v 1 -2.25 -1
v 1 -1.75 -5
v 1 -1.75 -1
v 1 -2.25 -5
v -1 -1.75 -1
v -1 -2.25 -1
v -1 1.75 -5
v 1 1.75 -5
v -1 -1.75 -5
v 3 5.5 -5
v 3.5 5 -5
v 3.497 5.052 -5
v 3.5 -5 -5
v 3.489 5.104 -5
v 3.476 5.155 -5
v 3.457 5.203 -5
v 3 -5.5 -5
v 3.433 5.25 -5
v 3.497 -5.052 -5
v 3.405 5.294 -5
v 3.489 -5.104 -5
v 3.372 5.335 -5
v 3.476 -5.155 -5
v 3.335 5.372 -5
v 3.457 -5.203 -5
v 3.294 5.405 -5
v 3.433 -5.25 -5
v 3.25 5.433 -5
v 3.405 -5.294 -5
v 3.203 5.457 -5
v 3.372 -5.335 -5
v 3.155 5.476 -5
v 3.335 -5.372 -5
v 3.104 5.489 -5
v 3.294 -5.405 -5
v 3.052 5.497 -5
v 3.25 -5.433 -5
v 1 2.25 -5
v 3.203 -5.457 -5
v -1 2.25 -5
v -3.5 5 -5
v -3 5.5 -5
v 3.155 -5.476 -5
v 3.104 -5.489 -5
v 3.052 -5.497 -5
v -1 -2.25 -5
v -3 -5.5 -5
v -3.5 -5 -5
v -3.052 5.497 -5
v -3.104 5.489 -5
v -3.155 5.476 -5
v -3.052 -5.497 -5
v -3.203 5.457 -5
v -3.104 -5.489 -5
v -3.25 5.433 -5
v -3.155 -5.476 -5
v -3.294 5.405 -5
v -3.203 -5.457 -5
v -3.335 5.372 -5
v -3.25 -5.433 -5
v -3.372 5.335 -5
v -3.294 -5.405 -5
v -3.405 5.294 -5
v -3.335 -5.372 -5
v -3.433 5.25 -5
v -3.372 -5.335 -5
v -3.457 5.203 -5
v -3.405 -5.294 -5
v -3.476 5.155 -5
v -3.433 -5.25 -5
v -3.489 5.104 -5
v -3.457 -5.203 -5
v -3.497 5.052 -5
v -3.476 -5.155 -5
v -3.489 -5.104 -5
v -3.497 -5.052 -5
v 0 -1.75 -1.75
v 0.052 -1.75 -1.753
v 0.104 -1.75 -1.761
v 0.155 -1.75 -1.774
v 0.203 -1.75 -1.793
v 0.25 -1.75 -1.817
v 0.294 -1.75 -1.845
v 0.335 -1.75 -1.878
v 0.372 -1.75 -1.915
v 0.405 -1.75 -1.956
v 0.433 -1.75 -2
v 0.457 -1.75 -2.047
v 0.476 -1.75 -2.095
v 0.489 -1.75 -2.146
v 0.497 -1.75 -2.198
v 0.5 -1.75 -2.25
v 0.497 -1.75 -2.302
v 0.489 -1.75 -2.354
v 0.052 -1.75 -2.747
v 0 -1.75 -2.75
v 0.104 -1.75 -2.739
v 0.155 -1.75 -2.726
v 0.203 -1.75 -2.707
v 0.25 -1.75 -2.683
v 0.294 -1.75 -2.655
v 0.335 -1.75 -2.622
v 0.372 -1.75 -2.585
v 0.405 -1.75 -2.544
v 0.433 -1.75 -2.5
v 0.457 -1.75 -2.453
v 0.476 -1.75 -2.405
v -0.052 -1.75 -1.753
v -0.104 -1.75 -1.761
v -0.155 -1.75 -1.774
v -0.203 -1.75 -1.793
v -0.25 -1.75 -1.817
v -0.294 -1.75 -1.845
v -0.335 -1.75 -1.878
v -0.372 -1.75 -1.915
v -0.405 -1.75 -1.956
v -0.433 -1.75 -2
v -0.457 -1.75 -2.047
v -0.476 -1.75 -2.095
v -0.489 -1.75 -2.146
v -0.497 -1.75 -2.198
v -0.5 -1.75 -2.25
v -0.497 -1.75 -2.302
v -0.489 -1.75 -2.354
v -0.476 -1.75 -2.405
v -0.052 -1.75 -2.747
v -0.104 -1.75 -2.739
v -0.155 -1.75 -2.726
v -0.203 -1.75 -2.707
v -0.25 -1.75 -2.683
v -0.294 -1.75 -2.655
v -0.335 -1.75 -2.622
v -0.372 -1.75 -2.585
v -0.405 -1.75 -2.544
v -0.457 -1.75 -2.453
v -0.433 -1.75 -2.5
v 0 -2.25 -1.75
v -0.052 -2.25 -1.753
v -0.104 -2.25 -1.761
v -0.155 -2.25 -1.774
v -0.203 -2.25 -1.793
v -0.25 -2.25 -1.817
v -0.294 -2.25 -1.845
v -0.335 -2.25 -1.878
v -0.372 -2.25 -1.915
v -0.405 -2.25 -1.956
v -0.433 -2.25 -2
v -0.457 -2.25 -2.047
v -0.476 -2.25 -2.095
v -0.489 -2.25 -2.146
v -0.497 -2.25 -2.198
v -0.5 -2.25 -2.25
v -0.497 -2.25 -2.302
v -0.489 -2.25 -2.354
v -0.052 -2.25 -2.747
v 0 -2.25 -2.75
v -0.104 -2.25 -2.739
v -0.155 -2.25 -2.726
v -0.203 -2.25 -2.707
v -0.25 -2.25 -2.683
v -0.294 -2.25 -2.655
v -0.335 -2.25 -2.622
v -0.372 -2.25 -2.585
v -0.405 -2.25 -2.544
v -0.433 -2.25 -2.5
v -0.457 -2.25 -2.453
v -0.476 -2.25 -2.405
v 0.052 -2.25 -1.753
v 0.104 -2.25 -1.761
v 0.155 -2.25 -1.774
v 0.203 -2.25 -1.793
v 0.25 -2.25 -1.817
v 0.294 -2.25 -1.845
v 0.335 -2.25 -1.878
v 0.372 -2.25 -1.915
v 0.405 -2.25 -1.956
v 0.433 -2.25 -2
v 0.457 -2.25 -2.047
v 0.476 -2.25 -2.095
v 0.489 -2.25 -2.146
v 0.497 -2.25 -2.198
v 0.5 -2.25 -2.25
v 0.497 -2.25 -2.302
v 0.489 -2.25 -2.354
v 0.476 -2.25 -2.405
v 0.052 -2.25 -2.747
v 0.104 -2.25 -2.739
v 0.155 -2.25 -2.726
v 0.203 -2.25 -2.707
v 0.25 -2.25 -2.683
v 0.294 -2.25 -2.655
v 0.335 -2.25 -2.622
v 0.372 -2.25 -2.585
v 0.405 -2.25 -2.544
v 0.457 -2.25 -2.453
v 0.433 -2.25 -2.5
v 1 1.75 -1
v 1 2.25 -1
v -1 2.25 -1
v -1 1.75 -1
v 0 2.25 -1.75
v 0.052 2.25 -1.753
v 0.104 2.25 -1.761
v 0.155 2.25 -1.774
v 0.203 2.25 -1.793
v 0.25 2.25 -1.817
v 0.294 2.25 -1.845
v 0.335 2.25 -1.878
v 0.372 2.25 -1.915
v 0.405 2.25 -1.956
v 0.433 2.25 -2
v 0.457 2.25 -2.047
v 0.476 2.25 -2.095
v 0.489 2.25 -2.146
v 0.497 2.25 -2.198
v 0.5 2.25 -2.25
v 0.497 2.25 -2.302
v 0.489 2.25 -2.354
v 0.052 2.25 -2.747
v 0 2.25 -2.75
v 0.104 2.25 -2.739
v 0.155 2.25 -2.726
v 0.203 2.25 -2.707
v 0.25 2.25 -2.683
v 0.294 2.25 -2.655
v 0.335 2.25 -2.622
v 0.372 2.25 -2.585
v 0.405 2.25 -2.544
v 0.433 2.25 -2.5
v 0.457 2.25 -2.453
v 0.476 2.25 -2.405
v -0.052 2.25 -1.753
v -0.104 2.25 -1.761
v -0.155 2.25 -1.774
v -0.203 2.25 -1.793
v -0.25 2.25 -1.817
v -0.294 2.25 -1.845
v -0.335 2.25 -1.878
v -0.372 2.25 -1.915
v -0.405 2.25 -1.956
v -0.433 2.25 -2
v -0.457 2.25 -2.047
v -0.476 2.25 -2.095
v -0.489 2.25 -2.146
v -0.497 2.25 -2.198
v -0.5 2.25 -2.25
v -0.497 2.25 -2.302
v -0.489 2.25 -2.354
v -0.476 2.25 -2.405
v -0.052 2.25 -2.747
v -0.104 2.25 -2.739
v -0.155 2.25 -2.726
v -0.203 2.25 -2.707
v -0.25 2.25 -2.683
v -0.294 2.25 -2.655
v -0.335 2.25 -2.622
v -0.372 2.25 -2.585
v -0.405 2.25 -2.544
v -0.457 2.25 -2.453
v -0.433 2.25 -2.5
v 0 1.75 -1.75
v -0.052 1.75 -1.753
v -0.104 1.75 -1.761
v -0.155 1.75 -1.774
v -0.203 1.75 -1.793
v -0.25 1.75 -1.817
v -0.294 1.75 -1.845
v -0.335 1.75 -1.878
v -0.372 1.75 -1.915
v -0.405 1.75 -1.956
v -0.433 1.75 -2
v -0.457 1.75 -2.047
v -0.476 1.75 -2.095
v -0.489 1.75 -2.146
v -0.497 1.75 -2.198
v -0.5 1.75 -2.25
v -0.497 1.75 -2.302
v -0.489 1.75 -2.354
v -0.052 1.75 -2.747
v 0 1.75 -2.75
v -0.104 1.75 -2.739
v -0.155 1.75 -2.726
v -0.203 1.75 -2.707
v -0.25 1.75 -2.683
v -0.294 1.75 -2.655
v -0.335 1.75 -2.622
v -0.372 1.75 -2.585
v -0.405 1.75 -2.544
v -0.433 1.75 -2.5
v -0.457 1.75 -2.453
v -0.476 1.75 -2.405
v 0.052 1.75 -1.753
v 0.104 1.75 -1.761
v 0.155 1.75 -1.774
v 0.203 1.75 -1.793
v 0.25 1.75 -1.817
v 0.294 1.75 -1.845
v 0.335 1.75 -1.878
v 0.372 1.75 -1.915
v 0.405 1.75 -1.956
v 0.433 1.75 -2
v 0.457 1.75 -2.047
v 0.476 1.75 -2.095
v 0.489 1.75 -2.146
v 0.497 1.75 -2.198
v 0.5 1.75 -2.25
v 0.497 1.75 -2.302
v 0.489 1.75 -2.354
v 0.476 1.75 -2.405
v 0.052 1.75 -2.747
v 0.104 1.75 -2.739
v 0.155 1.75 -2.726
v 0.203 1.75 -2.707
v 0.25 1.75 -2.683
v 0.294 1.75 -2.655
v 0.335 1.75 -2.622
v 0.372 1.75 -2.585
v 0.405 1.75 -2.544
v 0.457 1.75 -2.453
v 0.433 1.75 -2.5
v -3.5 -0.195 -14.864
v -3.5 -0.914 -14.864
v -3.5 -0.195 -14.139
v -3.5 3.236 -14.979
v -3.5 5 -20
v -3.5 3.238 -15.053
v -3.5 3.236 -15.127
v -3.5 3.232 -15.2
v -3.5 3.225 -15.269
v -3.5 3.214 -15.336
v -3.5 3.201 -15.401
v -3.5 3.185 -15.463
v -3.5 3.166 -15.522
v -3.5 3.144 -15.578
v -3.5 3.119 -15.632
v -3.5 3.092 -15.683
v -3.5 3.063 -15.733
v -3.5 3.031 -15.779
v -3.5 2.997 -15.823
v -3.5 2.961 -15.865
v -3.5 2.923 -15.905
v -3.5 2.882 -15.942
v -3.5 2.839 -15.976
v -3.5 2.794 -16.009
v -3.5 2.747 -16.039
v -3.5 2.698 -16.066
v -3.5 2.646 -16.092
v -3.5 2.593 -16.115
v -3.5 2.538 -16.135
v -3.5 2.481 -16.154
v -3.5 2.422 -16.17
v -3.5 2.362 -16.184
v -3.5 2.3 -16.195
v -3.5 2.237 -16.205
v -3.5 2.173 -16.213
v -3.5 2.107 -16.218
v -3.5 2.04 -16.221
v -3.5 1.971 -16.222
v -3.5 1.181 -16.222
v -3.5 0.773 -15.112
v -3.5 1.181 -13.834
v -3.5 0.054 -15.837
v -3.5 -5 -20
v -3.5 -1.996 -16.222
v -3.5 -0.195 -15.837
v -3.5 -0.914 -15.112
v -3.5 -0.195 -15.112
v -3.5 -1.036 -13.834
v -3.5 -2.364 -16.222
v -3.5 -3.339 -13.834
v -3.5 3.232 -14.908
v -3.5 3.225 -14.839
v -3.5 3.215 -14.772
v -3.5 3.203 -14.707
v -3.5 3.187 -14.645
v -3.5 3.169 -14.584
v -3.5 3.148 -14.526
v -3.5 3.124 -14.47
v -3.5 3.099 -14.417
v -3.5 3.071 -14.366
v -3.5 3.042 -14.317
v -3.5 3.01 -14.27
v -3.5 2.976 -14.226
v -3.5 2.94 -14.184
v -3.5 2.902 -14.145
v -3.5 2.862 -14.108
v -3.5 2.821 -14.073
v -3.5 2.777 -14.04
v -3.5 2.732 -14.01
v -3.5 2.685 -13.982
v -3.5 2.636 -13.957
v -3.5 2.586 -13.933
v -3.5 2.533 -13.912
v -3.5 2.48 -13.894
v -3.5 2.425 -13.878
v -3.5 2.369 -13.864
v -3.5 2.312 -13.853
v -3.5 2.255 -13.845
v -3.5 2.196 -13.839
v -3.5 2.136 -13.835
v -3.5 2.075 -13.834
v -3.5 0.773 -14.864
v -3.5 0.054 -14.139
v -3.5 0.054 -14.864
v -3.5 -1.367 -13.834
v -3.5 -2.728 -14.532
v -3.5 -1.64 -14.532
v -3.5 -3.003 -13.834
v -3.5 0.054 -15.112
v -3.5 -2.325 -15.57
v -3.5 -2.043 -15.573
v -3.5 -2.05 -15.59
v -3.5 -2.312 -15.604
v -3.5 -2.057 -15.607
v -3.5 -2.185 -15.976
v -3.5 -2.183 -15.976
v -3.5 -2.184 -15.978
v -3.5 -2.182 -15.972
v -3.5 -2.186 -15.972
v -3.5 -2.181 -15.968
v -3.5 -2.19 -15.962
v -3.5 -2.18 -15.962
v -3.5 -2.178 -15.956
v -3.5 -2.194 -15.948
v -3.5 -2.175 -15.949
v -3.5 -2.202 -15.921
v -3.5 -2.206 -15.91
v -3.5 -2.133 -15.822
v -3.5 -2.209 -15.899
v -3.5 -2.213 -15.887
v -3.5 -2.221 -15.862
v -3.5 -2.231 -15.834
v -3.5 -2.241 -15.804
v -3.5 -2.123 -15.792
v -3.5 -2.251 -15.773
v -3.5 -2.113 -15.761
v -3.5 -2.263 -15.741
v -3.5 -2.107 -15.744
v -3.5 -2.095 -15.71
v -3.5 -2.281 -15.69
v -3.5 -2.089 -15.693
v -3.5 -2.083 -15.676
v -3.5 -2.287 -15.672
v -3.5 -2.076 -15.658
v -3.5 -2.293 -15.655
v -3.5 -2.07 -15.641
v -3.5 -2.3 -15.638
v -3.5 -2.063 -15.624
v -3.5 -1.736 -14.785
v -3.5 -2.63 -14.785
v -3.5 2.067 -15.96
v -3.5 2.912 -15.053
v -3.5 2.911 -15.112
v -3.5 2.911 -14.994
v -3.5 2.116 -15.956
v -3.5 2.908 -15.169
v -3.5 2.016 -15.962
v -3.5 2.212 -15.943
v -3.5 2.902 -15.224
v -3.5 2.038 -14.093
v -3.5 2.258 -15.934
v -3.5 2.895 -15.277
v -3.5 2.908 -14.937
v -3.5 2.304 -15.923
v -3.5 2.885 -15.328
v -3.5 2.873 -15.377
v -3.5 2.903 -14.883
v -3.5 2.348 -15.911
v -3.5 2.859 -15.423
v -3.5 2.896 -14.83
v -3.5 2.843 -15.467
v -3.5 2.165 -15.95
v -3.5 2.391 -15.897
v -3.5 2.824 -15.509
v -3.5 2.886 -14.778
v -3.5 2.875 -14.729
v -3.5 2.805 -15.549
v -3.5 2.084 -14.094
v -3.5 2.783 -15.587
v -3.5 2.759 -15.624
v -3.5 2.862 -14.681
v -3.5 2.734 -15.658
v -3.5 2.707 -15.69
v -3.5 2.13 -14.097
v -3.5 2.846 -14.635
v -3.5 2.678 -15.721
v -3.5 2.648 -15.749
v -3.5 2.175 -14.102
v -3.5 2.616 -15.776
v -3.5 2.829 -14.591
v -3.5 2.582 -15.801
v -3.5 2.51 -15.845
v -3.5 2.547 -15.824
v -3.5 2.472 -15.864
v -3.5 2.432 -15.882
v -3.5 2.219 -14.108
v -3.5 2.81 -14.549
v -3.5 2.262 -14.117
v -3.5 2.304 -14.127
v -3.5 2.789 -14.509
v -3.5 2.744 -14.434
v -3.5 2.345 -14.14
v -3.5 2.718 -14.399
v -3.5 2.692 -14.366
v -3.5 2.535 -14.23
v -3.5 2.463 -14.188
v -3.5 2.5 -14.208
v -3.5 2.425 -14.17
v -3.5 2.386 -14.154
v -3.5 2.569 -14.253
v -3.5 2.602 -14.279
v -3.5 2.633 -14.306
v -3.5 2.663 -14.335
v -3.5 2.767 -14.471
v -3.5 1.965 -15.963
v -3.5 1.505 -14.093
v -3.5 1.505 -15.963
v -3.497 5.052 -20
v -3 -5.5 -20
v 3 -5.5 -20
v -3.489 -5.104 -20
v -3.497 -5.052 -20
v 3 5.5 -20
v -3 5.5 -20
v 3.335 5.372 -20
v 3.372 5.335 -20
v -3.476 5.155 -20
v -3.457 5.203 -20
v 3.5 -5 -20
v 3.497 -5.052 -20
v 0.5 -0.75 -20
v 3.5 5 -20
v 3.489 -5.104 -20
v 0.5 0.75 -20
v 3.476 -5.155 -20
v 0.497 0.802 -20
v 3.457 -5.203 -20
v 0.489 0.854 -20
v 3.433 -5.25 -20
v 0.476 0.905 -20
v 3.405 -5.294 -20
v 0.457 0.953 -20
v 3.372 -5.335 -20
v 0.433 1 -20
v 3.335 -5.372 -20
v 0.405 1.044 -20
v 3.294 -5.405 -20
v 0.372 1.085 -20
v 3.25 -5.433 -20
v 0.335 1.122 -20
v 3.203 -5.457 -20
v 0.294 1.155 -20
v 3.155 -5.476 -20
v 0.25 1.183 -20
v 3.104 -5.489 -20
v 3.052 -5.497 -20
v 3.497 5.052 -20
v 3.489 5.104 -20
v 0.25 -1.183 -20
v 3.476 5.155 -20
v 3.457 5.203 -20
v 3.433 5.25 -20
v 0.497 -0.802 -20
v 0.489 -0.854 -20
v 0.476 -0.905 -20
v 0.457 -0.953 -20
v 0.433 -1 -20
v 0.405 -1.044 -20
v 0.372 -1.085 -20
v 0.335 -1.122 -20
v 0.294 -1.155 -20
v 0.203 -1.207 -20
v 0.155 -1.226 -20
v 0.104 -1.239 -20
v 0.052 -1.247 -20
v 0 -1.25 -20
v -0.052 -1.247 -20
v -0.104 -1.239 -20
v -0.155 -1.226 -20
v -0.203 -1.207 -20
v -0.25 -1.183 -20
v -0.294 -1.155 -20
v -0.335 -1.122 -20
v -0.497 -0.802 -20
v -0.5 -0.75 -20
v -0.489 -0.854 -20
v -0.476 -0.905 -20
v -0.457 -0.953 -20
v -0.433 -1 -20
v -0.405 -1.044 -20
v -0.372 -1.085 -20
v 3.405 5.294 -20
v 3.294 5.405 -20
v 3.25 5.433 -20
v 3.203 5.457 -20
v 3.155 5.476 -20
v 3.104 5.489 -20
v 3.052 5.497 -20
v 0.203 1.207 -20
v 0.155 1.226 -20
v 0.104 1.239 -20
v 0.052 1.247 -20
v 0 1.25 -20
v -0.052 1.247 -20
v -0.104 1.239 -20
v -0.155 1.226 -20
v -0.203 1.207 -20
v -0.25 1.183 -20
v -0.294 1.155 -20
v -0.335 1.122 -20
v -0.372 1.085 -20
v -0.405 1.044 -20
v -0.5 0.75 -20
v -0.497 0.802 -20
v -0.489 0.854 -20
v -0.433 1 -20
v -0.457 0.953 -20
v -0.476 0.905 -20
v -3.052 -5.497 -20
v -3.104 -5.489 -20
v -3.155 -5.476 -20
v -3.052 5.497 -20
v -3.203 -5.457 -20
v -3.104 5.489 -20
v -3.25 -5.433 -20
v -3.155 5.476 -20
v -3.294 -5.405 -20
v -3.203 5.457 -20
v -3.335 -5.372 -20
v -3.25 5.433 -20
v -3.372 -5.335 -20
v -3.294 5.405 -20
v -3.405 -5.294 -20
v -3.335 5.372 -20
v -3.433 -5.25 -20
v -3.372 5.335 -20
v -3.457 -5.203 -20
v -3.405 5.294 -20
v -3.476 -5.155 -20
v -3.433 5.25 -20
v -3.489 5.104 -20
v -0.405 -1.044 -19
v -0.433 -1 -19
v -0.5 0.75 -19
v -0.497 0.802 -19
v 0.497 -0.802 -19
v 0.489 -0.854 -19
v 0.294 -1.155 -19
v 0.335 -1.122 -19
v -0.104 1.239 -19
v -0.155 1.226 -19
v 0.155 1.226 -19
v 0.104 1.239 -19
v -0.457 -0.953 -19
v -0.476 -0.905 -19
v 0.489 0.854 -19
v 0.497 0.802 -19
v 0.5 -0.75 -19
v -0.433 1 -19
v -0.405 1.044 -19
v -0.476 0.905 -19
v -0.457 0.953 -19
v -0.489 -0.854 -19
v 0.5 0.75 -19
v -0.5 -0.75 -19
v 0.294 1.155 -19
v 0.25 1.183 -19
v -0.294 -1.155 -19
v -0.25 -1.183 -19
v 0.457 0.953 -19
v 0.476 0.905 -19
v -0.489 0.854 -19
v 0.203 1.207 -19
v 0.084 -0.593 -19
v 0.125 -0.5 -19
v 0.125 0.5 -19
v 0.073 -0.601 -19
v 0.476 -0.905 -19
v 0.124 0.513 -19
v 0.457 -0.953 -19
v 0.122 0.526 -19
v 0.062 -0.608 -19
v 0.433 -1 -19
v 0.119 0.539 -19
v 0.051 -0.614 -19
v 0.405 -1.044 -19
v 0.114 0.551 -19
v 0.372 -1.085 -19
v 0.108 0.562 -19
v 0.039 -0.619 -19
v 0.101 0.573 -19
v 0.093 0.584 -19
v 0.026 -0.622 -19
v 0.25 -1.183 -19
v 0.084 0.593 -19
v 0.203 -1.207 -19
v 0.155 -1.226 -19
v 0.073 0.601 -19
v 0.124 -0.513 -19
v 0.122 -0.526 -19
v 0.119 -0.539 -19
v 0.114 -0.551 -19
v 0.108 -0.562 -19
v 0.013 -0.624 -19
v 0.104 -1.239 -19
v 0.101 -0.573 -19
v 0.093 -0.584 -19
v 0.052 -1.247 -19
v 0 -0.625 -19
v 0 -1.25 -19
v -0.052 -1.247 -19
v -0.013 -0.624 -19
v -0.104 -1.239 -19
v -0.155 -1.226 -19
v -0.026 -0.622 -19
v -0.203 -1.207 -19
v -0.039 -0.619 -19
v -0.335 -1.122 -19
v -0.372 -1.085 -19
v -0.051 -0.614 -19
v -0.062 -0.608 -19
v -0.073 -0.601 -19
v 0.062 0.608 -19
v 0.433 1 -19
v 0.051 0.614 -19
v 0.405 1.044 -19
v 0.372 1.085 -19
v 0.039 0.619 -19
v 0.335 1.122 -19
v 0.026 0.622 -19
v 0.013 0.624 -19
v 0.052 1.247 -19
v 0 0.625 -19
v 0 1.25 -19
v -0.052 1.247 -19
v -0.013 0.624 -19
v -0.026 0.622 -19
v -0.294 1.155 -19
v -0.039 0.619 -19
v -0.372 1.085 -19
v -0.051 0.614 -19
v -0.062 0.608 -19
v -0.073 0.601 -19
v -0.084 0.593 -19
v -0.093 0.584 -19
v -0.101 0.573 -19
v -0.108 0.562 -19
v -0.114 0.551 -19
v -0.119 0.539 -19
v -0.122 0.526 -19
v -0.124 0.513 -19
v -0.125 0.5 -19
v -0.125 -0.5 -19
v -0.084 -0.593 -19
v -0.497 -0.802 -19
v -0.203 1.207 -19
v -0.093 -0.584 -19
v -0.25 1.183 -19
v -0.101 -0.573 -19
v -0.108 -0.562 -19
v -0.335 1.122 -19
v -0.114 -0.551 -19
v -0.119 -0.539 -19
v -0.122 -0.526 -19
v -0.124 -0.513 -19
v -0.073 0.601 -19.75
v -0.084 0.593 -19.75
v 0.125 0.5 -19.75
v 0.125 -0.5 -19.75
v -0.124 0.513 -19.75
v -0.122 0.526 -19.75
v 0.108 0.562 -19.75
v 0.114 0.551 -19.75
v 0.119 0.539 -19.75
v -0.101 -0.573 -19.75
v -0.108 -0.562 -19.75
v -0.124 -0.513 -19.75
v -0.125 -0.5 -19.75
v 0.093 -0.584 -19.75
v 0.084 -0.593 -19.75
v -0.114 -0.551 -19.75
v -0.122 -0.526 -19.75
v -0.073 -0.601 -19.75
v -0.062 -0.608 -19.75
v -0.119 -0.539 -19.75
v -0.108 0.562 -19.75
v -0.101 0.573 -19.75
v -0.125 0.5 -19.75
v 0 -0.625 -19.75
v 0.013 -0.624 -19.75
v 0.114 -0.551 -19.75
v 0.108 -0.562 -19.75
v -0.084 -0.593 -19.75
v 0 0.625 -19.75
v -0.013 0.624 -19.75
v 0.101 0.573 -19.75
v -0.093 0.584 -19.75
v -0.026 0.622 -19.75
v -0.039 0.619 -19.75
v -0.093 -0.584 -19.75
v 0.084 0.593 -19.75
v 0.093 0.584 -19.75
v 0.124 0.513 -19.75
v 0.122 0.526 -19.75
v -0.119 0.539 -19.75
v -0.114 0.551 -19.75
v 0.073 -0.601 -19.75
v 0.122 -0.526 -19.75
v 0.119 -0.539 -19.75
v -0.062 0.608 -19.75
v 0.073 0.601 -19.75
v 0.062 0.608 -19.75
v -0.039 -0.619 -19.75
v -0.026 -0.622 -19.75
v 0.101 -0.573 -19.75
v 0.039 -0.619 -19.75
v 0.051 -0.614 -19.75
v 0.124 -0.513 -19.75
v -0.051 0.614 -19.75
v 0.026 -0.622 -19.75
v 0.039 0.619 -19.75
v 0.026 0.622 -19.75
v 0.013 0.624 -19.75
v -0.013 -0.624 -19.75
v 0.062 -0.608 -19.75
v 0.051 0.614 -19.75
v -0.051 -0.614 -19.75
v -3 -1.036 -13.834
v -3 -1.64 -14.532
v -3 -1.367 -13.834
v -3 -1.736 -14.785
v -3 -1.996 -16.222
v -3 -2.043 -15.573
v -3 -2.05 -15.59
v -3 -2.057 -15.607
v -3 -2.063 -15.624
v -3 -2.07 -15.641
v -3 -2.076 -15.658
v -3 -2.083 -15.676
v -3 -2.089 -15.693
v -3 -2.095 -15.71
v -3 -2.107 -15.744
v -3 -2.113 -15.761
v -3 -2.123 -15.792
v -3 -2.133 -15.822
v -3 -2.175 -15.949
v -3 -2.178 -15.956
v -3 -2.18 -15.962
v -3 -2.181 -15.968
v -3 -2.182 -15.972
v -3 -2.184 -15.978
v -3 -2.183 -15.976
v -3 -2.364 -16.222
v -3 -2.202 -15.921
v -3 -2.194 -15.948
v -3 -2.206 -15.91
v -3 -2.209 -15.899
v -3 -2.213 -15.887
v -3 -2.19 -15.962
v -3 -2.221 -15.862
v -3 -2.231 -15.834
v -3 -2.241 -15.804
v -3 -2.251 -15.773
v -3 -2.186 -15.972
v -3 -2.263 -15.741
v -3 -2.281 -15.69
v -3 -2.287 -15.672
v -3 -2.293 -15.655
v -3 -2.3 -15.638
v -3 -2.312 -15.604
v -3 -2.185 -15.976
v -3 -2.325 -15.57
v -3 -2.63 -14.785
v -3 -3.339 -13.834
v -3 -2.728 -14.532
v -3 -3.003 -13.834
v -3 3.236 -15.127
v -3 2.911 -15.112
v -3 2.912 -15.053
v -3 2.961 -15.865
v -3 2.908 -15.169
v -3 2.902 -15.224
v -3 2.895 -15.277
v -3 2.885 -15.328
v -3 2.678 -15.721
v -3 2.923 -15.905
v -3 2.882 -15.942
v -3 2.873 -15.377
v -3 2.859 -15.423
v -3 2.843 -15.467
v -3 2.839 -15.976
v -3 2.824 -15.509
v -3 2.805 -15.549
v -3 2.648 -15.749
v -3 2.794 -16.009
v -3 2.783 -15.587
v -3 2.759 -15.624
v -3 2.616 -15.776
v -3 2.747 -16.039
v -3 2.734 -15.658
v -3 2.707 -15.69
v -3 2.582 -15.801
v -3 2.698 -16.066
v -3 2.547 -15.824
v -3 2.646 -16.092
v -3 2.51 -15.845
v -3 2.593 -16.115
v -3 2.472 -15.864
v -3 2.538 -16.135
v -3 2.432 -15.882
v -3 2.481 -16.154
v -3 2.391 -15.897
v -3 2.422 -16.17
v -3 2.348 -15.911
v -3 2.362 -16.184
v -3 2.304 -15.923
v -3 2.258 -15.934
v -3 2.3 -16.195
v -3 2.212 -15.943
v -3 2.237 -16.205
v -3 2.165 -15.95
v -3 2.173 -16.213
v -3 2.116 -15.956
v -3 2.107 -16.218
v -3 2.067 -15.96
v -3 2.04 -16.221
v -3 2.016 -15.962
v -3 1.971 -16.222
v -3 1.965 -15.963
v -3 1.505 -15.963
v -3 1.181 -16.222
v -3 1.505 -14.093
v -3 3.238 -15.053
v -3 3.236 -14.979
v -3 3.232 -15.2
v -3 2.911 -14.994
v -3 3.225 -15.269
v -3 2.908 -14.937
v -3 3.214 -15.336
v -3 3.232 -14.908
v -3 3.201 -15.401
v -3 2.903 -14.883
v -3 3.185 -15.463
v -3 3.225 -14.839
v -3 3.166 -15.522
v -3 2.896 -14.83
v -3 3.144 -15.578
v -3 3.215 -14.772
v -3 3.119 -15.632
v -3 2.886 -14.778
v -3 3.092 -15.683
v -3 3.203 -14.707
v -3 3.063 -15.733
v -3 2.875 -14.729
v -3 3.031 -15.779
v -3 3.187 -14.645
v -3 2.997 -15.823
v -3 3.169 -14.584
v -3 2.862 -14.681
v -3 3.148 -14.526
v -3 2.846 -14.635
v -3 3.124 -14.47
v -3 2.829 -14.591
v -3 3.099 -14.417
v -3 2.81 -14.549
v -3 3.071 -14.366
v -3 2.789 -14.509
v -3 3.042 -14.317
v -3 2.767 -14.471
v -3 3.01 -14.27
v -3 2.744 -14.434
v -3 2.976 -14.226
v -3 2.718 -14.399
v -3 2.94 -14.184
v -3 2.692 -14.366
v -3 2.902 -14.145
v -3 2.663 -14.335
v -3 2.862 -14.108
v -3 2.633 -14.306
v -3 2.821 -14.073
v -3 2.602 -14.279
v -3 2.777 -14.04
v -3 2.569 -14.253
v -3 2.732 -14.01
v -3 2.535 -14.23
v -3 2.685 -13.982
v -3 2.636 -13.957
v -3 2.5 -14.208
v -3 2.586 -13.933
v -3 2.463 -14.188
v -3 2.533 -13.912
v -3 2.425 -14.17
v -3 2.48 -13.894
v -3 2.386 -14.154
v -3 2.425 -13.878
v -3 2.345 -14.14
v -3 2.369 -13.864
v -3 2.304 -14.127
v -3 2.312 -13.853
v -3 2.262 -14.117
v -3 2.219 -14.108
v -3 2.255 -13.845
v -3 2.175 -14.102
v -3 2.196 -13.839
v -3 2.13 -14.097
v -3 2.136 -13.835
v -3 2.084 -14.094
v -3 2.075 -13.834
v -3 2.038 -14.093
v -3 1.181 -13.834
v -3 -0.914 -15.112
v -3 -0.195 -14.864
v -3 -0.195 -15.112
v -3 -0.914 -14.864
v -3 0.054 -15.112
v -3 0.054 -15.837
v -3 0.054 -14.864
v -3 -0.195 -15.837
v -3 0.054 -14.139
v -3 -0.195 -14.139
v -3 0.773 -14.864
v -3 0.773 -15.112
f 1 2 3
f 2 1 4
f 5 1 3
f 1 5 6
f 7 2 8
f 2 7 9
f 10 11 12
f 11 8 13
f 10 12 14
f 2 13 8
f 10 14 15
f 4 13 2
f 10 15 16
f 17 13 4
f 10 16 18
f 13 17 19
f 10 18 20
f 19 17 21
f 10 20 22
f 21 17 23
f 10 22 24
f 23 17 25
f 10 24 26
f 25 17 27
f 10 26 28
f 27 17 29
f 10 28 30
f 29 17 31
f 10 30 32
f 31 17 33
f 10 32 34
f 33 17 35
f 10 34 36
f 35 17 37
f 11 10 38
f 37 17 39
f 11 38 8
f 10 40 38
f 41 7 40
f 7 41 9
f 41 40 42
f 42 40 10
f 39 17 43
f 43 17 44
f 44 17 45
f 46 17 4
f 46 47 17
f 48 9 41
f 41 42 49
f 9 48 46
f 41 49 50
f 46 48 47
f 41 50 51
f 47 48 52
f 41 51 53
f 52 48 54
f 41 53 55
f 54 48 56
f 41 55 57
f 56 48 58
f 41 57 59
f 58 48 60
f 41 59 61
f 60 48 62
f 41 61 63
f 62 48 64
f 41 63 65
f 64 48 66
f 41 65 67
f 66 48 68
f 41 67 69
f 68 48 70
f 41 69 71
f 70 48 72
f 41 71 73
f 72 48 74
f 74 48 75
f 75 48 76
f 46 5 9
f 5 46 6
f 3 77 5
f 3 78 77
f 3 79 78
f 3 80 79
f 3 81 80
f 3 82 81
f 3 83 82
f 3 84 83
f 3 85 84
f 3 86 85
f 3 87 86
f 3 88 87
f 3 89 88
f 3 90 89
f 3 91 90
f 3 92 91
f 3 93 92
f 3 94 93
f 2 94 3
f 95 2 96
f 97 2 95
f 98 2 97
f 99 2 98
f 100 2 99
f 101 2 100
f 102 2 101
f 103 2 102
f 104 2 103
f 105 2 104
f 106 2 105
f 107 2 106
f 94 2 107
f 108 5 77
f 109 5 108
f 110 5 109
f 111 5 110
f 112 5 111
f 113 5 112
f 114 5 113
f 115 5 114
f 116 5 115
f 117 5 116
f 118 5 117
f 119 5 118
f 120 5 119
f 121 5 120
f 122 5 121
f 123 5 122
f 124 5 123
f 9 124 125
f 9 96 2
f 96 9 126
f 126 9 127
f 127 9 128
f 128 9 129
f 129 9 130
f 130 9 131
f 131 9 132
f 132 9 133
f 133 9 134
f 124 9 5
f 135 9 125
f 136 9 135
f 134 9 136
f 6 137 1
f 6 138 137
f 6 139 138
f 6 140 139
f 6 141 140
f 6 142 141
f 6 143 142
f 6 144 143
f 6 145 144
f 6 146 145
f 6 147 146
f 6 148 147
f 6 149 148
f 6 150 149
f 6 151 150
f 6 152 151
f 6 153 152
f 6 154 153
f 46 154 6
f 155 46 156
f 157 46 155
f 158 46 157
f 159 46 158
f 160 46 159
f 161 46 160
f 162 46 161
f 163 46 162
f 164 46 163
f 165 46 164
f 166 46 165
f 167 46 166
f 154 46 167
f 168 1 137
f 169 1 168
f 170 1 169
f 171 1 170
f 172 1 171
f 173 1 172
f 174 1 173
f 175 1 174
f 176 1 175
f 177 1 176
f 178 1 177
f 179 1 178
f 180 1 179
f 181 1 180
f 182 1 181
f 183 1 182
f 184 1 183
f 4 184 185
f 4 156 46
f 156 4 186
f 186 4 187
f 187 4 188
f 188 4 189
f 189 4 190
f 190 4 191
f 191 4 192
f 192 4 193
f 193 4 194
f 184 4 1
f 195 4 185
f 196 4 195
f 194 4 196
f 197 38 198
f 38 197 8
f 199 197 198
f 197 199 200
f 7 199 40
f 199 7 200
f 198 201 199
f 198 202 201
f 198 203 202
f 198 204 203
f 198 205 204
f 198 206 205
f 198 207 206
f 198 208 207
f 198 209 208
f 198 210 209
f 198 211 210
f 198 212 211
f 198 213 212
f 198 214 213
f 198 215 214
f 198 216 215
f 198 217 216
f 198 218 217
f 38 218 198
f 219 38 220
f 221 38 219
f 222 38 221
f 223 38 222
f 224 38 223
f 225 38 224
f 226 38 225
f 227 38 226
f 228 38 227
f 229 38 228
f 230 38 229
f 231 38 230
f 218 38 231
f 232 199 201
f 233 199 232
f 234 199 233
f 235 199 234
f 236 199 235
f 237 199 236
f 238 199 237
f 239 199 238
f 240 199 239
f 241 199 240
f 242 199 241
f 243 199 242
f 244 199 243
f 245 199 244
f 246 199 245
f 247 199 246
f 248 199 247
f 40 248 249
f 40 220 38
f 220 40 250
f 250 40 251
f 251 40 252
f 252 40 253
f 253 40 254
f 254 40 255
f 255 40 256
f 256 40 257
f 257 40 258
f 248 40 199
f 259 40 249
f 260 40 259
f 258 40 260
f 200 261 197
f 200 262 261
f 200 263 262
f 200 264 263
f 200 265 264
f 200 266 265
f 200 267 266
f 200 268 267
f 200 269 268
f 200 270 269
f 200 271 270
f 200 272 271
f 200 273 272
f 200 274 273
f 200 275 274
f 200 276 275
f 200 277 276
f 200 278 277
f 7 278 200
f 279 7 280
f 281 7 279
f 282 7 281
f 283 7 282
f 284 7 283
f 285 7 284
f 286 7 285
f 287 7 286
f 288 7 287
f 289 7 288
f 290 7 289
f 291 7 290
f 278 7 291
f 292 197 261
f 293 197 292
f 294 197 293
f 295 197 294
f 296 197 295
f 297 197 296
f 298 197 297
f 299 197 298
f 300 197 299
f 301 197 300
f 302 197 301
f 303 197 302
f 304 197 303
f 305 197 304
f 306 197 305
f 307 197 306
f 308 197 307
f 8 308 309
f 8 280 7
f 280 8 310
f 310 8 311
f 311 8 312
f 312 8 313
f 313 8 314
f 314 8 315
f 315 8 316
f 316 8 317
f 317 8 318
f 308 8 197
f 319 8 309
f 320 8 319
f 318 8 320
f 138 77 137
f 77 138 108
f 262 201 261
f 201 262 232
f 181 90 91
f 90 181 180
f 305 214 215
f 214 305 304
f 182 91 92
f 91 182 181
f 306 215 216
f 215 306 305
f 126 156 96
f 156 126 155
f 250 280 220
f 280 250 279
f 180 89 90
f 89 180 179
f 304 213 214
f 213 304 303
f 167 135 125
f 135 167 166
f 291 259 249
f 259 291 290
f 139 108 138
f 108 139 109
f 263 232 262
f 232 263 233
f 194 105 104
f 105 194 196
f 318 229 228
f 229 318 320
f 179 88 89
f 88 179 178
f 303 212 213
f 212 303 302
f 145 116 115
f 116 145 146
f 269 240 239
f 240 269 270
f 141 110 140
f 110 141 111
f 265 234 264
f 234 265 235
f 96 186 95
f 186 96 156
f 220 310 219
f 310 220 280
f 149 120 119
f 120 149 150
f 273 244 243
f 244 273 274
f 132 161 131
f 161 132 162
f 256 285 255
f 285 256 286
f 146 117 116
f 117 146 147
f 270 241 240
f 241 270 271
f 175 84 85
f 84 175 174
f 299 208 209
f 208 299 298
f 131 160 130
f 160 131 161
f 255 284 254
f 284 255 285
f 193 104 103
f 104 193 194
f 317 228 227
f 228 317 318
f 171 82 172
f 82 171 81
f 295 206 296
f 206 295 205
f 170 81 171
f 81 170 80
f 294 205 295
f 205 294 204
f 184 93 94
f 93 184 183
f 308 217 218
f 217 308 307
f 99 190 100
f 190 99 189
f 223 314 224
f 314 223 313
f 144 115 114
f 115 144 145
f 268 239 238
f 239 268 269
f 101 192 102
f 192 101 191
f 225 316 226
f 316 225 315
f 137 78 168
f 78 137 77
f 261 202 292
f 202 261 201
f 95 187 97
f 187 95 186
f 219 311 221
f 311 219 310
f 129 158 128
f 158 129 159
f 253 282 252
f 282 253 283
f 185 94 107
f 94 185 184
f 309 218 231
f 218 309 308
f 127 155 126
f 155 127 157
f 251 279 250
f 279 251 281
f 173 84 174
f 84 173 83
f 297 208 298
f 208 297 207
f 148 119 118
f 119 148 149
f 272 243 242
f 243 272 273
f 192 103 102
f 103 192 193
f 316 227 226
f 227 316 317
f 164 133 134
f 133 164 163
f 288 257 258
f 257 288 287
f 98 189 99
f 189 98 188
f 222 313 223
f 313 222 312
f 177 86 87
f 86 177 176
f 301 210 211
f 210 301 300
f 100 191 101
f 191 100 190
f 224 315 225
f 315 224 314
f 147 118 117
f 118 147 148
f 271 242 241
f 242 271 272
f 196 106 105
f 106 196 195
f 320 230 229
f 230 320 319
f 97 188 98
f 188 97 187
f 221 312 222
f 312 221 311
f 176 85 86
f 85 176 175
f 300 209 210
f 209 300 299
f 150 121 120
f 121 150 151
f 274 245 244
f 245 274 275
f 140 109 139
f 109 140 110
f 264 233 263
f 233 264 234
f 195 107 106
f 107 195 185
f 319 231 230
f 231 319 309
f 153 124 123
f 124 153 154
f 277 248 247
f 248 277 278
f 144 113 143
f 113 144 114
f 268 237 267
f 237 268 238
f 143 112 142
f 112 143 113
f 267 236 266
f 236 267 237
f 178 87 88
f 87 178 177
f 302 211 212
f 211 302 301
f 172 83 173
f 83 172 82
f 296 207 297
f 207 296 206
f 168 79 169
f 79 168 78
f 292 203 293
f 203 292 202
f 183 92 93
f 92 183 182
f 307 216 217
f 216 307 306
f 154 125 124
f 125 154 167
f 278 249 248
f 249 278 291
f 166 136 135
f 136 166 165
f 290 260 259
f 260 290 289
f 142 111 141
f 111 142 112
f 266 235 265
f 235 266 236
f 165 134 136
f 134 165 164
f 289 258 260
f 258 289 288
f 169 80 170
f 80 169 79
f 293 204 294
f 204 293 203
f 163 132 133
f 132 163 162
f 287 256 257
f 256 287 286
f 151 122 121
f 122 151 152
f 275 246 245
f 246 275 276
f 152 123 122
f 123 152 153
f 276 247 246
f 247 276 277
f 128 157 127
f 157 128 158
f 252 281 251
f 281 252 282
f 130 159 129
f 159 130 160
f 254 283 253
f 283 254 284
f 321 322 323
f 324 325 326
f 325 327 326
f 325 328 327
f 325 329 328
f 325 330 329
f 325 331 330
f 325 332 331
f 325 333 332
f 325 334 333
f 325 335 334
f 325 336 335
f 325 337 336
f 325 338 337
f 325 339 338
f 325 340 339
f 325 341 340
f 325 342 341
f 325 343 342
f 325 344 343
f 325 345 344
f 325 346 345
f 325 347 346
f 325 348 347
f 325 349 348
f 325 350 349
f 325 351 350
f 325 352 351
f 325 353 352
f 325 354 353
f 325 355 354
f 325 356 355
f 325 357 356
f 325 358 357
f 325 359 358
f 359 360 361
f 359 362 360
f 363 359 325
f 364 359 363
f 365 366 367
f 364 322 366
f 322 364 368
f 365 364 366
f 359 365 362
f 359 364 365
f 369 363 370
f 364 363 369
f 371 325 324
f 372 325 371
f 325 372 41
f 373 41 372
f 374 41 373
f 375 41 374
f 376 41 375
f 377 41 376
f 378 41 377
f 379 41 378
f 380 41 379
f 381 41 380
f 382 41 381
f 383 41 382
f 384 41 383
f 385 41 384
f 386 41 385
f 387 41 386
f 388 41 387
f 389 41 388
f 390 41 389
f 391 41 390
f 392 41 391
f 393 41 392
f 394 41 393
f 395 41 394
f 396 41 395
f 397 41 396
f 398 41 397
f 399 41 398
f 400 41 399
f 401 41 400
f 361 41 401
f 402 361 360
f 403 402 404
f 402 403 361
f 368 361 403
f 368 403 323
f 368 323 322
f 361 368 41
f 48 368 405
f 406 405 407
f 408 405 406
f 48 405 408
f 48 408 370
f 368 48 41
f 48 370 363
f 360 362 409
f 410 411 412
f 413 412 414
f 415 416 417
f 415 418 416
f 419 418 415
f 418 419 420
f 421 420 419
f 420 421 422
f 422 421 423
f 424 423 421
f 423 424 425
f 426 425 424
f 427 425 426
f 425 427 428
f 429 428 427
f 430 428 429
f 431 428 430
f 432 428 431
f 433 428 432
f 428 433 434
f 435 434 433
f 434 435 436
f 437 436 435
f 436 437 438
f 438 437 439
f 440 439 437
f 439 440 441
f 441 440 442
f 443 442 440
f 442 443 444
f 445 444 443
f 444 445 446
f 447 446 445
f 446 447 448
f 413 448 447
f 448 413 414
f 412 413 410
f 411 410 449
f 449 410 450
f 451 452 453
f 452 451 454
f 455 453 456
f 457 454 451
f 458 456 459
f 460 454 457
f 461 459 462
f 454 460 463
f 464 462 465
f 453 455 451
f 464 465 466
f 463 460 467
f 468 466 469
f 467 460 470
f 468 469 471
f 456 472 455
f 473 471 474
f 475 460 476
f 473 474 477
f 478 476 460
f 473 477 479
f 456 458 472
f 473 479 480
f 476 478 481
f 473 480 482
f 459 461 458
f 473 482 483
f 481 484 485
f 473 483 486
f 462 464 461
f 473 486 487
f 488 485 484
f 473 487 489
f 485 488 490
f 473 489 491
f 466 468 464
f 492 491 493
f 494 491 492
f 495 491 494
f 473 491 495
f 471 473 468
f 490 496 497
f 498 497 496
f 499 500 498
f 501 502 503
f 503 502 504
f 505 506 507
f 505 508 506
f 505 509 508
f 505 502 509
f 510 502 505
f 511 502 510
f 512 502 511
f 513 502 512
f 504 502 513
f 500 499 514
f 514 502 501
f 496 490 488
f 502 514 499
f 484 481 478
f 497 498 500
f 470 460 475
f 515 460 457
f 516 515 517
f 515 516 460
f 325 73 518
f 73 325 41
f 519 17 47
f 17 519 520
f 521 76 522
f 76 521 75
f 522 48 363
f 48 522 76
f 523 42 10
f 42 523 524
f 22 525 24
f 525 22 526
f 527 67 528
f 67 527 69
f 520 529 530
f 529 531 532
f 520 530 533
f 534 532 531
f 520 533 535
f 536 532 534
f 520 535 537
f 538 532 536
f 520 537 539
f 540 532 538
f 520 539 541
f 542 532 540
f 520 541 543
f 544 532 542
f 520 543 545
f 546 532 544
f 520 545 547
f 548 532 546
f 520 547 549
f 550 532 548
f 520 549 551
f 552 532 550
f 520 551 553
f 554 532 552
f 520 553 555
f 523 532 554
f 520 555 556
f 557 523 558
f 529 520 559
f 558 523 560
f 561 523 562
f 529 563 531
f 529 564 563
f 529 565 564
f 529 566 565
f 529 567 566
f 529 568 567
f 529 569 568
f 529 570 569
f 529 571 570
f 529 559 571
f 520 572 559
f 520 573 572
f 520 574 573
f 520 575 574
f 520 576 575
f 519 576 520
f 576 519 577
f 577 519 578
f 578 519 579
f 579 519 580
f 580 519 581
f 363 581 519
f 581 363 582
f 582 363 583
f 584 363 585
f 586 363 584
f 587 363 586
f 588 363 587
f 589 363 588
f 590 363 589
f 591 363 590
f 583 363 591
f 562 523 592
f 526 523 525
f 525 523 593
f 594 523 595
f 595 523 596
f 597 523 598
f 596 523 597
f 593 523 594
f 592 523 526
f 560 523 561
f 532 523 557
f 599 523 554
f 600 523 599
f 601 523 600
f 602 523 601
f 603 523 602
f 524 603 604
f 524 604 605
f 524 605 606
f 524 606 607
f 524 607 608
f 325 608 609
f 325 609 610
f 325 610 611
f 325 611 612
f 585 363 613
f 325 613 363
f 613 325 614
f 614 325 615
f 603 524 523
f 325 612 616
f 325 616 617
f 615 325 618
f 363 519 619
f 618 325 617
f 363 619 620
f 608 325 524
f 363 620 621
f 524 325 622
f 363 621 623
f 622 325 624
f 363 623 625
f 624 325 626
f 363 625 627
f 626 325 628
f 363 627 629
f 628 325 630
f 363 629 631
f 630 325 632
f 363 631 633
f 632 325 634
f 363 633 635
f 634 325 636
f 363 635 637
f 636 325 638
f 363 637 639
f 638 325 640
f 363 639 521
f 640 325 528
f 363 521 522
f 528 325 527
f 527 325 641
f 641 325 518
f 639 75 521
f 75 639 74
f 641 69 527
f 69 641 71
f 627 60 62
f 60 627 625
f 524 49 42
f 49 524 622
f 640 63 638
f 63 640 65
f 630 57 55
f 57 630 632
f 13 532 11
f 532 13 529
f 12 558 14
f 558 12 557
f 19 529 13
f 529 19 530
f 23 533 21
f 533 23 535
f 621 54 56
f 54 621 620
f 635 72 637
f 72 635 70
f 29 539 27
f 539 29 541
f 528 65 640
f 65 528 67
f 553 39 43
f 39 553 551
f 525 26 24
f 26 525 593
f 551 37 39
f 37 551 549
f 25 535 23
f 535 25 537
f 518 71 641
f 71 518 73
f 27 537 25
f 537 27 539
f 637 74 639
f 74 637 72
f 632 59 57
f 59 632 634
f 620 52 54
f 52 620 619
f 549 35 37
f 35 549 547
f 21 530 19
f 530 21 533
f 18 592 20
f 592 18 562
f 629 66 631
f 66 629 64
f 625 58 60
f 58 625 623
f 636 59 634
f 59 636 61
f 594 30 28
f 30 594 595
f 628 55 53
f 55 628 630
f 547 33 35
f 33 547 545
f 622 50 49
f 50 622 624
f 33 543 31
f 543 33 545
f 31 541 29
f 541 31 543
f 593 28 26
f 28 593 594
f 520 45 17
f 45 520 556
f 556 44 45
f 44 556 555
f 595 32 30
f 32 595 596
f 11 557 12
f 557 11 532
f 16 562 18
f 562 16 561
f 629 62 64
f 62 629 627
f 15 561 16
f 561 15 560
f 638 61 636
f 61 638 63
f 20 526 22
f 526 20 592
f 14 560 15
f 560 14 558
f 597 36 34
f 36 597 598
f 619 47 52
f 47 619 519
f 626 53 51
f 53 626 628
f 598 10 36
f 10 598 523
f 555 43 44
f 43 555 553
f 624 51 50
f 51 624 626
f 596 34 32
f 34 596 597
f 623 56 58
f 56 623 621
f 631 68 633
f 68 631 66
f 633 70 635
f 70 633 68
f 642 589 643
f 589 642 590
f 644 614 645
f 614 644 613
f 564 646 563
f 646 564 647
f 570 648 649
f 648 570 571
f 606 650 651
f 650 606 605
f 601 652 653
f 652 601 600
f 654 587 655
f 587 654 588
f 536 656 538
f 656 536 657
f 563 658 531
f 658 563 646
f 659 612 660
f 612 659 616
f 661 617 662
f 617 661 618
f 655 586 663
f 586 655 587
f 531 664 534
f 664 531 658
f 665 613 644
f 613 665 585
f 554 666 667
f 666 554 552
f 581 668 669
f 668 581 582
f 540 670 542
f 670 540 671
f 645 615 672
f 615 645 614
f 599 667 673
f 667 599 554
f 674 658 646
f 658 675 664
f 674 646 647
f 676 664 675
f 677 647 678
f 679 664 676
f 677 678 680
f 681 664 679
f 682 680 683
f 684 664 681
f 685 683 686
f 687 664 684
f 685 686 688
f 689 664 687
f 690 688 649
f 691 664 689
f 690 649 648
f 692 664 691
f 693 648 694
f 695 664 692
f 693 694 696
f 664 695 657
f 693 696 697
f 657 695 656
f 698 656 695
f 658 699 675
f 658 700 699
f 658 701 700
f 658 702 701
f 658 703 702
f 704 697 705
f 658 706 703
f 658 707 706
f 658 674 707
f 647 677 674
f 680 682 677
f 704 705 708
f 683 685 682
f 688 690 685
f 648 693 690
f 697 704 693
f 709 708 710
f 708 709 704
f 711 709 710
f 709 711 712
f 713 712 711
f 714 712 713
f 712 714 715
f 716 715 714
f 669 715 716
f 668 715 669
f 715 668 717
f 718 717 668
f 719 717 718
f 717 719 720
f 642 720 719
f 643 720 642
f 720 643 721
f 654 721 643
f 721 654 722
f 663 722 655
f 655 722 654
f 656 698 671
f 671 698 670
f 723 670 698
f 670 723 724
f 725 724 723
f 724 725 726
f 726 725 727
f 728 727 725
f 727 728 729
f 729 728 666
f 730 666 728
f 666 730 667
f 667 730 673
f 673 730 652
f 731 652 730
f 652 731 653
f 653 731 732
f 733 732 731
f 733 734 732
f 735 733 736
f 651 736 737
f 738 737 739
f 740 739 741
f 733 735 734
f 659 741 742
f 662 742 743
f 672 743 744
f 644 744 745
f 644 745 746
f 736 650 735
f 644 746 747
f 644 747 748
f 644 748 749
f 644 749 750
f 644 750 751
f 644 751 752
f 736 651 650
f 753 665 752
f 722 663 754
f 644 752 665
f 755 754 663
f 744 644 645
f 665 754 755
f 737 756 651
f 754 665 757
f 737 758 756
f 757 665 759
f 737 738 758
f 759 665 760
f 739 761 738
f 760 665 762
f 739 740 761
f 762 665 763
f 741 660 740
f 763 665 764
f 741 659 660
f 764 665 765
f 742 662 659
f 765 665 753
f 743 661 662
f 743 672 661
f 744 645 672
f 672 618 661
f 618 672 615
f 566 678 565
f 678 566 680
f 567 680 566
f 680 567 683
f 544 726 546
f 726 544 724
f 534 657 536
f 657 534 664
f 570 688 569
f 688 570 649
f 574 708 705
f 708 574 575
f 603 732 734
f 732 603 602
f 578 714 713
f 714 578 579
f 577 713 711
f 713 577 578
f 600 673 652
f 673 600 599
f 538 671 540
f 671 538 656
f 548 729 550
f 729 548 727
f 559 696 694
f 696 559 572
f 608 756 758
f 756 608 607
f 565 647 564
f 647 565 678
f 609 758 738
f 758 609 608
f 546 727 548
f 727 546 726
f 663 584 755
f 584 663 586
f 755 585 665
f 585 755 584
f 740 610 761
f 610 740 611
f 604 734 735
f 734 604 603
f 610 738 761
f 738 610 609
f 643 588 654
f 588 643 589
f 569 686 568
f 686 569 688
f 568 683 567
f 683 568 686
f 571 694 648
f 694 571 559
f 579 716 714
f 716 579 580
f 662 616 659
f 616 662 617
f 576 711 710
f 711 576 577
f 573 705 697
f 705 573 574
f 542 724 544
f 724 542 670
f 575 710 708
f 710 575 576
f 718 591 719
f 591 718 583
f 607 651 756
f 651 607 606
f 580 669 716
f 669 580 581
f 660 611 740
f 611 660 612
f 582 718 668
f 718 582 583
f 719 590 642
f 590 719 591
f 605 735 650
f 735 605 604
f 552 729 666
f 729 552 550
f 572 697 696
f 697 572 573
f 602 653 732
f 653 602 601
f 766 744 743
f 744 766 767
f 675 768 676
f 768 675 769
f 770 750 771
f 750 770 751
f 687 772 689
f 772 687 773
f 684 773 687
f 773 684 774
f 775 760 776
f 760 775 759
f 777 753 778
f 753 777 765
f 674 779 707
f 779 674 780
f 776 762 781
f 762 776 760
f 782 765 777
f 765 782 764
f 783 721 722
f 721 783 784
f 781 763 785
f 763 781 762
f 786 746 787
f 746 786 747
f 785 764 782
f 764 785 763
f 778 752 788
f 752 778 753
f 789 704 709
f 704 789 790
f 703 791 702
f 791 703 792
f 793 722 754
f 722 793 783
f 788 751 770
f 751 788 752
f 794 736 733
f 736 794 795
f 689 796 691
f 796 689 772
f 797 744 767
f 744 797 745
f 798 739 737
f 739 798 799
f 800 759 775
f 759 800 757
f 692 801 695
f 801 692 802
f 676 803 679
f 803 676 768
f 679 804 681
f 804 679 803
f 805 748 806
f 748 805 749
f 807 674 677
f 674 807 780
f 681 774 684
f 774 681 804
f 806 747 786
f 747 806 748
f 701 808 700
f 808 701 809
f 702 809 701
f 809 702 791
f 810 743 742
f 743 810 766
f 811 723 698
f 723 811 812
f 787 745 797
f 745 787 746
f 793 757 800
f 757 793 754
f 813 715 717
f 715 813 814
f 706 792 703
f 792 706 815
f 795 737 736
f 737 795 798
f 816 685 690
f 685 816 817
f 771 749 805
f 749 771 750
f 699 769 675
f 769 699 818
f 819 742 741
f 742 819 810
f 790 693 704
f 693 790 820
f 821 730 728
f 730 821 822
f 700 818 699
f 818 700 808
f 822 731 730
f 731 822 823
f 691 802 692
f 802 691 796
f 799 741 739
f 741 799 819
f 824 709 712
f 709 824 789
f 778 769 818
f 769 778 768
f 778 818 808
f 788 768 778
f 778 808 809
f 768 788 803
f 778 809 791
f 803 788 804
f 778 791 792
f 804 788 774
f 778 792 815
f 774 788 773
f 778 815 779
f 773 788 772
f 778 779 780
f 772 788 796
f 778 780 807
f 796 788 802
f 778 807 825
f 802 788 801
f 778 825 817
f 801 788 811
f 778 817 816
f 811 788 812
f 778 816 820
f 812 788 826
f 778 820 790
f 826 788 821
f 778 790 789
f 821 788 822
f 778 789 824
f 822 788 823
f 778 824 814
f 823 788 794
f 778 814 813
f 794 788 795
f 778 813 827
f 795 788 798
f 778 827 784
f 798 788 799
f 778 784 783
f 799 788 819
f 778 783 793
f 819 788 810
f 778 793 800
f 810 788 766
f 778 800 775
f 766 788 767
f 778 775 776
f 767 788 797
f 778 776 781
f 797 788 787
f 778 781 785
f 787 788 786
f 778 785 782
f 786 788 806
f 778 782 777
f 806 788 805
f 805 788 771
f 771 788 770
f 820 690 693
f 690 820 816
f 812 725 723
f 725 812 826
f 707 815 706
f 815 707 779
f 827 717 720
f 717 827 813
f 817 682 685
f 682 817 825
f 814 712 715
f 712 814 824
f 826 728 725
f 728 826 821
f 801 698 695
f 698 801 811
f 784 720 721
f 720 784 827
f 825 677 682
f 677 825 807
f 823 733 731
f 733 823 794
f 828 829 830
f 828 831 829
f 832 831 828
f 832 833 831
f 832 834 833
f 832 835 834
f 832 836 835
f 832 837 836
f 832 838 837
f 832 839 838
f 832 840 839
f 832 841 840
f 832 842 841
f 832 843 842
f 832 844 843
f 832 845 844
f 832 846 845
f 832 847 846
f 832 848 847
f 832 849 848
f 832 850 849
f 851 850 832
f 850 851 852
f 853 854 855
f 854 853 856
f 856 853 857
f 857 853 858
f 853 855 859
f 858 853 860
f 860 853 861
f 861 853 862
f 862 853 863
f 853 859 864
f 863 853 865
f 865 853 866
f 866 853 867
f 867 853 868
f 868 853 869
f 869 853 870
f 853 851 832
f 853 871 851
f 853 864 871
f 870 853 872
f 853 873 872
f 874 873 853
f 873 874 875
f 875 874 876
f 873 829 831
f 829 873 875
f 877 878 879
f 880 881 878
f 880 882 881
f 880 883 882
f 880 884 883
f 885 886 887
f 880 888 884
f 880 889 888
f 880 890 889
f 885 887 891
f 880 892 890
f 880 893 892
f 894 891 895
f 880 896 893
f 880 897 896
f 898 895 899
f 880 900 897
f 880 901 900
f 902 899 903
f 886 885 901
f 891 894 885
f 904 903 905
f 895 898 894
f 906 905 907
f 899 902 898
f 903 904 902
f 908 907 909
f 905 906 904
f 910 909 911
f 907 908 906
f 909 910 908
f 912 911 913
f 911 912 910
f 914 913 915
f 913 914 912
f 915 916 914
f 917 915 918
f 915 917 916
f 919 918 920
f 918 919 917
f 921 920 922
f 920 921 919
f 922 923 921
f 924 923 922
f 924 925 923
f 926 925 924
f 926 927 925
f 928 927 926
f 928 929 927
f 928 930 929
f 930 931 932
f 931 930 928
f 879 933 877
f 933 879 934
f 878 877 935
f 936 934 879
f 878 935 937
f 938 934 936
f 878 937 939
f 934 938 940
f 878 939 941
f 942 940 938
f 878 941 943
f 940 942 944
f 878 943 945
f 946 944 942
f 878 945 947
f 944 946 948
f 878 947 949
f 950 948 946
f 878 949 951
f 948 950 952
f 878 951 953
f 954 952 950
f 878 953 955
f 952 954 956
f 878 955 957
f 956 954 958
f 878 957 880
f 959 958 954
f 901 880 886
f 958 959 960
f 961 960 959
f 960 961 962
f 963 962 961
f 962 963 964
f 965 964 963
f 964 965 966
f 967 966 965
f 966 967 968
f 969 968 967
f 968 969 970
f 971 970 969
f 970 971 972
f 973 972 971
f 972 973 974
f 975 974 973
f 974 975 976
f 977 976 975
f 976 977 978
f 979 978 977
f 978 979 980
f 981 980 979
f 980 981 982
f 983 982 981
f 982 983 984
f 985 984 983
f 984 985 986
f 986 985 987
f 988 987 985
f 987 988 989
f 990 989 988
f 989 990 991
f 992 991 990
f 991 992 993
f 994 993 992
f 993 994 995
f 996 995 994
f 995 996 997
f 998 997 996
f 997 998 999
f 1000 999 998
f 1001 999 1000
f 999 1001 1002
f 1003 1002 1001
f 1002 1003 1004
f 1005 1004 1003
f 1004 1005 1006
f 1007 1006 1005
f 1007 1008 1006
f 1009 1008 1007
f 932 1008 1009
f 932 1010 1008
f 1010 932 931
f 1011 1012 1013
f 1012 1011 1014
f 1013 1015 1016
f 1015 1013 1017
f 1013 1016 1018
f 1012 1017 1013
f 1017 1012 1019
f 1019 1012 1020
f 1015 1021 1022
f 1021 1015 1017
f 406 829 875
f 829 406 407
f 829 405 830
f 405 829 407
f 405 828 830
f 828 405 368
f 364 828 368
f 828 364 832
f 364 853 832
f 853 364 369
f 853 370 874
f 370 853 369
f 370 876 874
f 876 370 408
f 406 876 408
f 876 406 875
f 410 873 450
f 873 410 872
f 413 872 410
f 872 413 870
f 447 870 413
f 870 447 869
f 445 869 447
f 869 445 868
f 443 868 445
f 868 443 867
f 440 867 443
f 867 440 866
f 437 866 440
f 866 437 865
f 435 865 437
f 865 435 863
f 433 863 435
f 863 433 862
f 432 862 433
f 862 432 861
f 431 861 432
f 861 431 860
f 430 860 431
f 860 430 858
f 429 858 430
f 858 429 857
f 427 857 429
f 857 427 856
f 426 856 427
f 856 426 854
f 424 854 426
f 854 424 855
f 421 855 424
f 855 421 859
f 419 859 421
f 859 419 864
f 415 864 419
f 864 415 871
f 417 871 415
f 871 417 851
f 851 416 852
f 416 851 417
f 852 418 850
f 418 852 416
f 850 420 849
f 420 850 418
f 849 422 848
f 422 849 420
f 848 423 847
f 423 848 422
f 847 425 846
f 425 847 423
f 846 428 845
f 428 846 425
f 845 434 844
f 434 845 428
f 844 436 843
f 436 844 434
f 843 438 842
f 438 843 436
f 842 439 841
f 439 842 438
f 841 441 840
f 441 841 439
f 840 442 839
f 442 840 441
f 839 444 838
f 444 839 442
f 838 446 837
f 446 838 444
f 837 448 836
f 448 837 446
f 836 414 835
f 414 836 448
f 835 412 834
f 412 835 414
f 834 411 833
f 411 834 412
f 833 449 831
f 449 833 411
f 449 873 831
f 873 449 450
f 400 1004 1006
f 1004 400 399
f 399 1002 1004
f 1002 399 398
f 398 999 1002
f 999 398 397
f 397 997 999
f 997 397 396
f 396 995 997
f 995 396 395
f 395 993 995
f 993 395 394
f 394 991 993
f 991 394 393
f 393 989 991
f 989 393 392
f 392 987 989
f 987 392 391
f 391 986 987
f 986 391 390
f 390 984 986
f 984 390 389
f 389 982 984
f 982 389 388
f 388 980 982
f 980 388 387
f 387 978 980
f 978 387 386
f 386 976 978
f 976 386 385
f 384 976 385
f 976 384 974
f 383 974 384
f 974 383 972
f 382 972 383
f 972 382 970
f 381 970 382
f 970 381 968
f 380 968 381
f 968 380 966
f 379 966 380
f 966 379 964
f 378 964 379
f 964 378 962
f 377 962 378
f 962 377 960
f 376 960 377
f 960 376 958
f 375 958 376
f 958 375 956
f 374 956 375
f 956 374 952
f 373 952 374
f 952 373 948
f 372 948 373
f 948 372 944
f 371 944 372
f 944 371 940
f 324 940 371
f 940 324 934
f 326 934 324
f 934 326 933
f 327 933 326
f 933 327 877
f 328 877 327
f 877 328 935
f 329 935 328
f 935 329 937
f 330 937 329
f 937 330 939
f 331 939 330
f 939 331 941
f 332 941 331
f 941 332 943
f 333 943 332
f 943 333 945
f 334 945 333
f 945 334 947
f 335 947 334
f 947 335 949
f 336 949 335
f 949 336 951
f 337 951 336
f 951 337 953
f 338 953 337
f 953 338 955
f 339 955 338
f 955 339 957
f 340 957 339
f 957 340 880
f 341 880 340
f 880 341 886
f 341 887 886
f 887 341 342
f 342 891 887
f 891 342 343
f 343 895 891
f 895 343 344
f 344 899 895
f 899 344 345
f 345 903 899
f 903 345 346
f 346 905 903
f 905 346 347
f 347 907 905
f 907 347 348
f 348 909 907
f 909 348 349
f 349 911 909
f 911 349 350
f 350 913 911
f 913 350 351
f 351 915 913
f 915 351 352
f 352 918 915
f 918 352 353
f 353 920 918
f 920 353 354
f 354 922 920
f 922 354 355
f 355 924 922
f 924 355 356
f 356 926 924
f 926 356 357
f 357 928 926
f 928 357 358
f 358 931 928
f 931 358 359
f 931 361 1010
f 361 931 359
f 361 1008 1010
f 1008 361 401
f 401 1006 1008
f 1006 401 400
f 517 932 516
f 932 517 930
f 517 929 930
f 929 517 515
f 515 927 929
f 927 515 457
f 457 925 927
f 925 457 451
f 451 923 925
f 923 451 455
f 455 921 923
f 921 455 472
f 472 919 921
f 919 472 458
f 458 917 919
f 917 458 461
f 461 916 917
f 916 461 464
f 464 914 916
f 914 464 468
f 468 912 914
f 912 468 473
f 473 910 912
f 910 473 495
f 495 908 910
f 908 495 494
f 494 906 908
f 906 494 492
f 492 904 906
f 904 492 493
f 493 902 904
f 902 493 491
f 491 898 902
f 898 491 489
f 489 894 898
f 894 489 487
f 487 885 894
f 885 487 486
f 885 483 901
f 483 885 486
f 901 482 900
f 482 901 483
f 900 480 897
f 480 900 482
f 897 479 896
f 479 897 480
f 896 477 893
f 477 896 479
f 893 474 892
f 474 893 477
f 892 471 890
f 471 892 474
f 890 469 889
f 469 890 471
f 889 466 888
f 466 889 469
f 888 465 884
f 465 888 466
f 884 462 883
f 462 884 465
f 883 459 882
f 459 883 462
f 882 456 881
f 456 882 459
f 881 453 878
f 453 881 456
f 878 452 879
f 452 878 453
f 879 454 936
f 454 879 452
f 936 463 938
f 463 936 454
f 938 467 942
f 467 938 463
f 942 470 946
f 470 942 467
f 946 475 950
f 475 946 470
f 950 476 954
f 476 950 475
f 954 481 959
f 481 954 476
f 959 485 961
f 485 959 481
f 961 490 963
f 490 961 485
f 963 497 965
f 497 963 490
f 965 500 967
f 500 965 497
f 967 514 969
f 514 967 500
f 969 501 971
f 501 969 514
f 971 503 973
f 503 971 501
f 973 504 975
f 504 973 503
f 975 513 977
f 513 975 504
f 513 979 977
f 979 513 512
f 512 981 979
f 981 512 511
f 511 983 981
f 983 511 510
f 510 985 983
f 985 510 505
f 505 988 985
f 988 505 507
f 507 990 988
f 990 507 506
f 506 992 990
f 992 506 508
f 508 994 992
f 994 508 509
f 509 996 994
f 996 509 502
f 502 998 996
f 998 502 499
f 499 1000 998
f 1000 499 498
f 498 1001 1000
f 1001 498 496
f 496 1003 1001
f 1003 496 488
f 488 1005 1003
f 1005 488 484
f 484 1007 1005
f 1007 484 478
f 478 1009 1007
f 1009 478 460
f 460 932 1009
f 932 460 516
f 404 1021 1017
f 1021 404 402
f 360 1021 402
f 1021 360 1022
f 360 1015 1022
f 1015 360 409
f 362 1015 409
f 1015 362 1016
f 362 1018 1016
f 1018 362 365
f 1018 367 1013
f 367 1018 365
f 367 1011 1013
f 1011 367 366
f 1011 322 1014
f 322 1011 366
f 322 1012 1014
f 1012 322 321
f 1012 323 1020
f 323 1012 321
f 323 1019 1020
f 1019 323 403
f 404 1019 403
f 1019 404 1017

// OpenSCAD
// USB-C Tofu Brick with US/Taiwan Type-A wallplug
// NOT proportional, no measurements were done.
//
// Alison Chu & Daniel Schaefer 2022

$fn=60;

height =15; // z-len
width  =6;  // x-len
depth  =10; // y-len

// Shift below axes
shift=-20;

// Rotate and animate
// Use 60 FPS and 360 Steps
$vpt = [0,0,shift]; // Move to focus on object
$vpr = [60, 180, 360 * $t]; // Flip around(180) and rotate around it
$vpd = 100;

// Shift to the origin
translate([-width/2, -depth/2, shift])
difference() {
    tofu_usb_c();

    // Text engraving
    translate([0,depth/2,5])
    rotate([-90,0,90])
    linear_extrude(0.5)
    text("A+D", size=2.5, valign="center", halign="center");
}

module brick_with_prongs() {
  // Brick with rounded edges
  minkowski(){
      cube([width,depth,height/2]);
      cylinder(h=height/2, r=0.5);
  };

  // Prongs
  prong_height=4;
  translate([width/2,3,height+prong_height/2]) {
    difference() {
      // Both prongs
      union() {
        cube([2,0.5,prong_height], center=true);   
        translate([0,4,0])
        cube([2,0.5,prong_height], center=true);
      }

      // Cut through both with a long cylinder
      translate([0,0,0.75])
      rotate([90,0,0])
      cylinder(h=10,r=0.5,center=true);
    }
  }
}

module tofu_usb_c() {
  difference() {
    brick_with_prongs();

    // Cut out USB-C hole
    translate([width/2, depth/2, 0]) {
      hull(){
          translate([0, 0.75, 0])
            cylinder(h=1, r=0.5);
          translate([0, -0.75, 0])
            cylinder(h=1, r=0.5);
      };
    }
  }

  // Add USB-C prong in the middle
  translate([width/2, depth/2, 0.25])
  //minkowski(){
  //    cube([0.1,1,2]);
  //    cylinder(h=0.5, r=0.125);
  //};
  hull(){
      translate([0, 0.5, 0])
        cylinder(h=0.75, r=0.125);
      translate([0, -0.5, 0])
        cylinder(h=0.75, r=0.125);
  };
};
